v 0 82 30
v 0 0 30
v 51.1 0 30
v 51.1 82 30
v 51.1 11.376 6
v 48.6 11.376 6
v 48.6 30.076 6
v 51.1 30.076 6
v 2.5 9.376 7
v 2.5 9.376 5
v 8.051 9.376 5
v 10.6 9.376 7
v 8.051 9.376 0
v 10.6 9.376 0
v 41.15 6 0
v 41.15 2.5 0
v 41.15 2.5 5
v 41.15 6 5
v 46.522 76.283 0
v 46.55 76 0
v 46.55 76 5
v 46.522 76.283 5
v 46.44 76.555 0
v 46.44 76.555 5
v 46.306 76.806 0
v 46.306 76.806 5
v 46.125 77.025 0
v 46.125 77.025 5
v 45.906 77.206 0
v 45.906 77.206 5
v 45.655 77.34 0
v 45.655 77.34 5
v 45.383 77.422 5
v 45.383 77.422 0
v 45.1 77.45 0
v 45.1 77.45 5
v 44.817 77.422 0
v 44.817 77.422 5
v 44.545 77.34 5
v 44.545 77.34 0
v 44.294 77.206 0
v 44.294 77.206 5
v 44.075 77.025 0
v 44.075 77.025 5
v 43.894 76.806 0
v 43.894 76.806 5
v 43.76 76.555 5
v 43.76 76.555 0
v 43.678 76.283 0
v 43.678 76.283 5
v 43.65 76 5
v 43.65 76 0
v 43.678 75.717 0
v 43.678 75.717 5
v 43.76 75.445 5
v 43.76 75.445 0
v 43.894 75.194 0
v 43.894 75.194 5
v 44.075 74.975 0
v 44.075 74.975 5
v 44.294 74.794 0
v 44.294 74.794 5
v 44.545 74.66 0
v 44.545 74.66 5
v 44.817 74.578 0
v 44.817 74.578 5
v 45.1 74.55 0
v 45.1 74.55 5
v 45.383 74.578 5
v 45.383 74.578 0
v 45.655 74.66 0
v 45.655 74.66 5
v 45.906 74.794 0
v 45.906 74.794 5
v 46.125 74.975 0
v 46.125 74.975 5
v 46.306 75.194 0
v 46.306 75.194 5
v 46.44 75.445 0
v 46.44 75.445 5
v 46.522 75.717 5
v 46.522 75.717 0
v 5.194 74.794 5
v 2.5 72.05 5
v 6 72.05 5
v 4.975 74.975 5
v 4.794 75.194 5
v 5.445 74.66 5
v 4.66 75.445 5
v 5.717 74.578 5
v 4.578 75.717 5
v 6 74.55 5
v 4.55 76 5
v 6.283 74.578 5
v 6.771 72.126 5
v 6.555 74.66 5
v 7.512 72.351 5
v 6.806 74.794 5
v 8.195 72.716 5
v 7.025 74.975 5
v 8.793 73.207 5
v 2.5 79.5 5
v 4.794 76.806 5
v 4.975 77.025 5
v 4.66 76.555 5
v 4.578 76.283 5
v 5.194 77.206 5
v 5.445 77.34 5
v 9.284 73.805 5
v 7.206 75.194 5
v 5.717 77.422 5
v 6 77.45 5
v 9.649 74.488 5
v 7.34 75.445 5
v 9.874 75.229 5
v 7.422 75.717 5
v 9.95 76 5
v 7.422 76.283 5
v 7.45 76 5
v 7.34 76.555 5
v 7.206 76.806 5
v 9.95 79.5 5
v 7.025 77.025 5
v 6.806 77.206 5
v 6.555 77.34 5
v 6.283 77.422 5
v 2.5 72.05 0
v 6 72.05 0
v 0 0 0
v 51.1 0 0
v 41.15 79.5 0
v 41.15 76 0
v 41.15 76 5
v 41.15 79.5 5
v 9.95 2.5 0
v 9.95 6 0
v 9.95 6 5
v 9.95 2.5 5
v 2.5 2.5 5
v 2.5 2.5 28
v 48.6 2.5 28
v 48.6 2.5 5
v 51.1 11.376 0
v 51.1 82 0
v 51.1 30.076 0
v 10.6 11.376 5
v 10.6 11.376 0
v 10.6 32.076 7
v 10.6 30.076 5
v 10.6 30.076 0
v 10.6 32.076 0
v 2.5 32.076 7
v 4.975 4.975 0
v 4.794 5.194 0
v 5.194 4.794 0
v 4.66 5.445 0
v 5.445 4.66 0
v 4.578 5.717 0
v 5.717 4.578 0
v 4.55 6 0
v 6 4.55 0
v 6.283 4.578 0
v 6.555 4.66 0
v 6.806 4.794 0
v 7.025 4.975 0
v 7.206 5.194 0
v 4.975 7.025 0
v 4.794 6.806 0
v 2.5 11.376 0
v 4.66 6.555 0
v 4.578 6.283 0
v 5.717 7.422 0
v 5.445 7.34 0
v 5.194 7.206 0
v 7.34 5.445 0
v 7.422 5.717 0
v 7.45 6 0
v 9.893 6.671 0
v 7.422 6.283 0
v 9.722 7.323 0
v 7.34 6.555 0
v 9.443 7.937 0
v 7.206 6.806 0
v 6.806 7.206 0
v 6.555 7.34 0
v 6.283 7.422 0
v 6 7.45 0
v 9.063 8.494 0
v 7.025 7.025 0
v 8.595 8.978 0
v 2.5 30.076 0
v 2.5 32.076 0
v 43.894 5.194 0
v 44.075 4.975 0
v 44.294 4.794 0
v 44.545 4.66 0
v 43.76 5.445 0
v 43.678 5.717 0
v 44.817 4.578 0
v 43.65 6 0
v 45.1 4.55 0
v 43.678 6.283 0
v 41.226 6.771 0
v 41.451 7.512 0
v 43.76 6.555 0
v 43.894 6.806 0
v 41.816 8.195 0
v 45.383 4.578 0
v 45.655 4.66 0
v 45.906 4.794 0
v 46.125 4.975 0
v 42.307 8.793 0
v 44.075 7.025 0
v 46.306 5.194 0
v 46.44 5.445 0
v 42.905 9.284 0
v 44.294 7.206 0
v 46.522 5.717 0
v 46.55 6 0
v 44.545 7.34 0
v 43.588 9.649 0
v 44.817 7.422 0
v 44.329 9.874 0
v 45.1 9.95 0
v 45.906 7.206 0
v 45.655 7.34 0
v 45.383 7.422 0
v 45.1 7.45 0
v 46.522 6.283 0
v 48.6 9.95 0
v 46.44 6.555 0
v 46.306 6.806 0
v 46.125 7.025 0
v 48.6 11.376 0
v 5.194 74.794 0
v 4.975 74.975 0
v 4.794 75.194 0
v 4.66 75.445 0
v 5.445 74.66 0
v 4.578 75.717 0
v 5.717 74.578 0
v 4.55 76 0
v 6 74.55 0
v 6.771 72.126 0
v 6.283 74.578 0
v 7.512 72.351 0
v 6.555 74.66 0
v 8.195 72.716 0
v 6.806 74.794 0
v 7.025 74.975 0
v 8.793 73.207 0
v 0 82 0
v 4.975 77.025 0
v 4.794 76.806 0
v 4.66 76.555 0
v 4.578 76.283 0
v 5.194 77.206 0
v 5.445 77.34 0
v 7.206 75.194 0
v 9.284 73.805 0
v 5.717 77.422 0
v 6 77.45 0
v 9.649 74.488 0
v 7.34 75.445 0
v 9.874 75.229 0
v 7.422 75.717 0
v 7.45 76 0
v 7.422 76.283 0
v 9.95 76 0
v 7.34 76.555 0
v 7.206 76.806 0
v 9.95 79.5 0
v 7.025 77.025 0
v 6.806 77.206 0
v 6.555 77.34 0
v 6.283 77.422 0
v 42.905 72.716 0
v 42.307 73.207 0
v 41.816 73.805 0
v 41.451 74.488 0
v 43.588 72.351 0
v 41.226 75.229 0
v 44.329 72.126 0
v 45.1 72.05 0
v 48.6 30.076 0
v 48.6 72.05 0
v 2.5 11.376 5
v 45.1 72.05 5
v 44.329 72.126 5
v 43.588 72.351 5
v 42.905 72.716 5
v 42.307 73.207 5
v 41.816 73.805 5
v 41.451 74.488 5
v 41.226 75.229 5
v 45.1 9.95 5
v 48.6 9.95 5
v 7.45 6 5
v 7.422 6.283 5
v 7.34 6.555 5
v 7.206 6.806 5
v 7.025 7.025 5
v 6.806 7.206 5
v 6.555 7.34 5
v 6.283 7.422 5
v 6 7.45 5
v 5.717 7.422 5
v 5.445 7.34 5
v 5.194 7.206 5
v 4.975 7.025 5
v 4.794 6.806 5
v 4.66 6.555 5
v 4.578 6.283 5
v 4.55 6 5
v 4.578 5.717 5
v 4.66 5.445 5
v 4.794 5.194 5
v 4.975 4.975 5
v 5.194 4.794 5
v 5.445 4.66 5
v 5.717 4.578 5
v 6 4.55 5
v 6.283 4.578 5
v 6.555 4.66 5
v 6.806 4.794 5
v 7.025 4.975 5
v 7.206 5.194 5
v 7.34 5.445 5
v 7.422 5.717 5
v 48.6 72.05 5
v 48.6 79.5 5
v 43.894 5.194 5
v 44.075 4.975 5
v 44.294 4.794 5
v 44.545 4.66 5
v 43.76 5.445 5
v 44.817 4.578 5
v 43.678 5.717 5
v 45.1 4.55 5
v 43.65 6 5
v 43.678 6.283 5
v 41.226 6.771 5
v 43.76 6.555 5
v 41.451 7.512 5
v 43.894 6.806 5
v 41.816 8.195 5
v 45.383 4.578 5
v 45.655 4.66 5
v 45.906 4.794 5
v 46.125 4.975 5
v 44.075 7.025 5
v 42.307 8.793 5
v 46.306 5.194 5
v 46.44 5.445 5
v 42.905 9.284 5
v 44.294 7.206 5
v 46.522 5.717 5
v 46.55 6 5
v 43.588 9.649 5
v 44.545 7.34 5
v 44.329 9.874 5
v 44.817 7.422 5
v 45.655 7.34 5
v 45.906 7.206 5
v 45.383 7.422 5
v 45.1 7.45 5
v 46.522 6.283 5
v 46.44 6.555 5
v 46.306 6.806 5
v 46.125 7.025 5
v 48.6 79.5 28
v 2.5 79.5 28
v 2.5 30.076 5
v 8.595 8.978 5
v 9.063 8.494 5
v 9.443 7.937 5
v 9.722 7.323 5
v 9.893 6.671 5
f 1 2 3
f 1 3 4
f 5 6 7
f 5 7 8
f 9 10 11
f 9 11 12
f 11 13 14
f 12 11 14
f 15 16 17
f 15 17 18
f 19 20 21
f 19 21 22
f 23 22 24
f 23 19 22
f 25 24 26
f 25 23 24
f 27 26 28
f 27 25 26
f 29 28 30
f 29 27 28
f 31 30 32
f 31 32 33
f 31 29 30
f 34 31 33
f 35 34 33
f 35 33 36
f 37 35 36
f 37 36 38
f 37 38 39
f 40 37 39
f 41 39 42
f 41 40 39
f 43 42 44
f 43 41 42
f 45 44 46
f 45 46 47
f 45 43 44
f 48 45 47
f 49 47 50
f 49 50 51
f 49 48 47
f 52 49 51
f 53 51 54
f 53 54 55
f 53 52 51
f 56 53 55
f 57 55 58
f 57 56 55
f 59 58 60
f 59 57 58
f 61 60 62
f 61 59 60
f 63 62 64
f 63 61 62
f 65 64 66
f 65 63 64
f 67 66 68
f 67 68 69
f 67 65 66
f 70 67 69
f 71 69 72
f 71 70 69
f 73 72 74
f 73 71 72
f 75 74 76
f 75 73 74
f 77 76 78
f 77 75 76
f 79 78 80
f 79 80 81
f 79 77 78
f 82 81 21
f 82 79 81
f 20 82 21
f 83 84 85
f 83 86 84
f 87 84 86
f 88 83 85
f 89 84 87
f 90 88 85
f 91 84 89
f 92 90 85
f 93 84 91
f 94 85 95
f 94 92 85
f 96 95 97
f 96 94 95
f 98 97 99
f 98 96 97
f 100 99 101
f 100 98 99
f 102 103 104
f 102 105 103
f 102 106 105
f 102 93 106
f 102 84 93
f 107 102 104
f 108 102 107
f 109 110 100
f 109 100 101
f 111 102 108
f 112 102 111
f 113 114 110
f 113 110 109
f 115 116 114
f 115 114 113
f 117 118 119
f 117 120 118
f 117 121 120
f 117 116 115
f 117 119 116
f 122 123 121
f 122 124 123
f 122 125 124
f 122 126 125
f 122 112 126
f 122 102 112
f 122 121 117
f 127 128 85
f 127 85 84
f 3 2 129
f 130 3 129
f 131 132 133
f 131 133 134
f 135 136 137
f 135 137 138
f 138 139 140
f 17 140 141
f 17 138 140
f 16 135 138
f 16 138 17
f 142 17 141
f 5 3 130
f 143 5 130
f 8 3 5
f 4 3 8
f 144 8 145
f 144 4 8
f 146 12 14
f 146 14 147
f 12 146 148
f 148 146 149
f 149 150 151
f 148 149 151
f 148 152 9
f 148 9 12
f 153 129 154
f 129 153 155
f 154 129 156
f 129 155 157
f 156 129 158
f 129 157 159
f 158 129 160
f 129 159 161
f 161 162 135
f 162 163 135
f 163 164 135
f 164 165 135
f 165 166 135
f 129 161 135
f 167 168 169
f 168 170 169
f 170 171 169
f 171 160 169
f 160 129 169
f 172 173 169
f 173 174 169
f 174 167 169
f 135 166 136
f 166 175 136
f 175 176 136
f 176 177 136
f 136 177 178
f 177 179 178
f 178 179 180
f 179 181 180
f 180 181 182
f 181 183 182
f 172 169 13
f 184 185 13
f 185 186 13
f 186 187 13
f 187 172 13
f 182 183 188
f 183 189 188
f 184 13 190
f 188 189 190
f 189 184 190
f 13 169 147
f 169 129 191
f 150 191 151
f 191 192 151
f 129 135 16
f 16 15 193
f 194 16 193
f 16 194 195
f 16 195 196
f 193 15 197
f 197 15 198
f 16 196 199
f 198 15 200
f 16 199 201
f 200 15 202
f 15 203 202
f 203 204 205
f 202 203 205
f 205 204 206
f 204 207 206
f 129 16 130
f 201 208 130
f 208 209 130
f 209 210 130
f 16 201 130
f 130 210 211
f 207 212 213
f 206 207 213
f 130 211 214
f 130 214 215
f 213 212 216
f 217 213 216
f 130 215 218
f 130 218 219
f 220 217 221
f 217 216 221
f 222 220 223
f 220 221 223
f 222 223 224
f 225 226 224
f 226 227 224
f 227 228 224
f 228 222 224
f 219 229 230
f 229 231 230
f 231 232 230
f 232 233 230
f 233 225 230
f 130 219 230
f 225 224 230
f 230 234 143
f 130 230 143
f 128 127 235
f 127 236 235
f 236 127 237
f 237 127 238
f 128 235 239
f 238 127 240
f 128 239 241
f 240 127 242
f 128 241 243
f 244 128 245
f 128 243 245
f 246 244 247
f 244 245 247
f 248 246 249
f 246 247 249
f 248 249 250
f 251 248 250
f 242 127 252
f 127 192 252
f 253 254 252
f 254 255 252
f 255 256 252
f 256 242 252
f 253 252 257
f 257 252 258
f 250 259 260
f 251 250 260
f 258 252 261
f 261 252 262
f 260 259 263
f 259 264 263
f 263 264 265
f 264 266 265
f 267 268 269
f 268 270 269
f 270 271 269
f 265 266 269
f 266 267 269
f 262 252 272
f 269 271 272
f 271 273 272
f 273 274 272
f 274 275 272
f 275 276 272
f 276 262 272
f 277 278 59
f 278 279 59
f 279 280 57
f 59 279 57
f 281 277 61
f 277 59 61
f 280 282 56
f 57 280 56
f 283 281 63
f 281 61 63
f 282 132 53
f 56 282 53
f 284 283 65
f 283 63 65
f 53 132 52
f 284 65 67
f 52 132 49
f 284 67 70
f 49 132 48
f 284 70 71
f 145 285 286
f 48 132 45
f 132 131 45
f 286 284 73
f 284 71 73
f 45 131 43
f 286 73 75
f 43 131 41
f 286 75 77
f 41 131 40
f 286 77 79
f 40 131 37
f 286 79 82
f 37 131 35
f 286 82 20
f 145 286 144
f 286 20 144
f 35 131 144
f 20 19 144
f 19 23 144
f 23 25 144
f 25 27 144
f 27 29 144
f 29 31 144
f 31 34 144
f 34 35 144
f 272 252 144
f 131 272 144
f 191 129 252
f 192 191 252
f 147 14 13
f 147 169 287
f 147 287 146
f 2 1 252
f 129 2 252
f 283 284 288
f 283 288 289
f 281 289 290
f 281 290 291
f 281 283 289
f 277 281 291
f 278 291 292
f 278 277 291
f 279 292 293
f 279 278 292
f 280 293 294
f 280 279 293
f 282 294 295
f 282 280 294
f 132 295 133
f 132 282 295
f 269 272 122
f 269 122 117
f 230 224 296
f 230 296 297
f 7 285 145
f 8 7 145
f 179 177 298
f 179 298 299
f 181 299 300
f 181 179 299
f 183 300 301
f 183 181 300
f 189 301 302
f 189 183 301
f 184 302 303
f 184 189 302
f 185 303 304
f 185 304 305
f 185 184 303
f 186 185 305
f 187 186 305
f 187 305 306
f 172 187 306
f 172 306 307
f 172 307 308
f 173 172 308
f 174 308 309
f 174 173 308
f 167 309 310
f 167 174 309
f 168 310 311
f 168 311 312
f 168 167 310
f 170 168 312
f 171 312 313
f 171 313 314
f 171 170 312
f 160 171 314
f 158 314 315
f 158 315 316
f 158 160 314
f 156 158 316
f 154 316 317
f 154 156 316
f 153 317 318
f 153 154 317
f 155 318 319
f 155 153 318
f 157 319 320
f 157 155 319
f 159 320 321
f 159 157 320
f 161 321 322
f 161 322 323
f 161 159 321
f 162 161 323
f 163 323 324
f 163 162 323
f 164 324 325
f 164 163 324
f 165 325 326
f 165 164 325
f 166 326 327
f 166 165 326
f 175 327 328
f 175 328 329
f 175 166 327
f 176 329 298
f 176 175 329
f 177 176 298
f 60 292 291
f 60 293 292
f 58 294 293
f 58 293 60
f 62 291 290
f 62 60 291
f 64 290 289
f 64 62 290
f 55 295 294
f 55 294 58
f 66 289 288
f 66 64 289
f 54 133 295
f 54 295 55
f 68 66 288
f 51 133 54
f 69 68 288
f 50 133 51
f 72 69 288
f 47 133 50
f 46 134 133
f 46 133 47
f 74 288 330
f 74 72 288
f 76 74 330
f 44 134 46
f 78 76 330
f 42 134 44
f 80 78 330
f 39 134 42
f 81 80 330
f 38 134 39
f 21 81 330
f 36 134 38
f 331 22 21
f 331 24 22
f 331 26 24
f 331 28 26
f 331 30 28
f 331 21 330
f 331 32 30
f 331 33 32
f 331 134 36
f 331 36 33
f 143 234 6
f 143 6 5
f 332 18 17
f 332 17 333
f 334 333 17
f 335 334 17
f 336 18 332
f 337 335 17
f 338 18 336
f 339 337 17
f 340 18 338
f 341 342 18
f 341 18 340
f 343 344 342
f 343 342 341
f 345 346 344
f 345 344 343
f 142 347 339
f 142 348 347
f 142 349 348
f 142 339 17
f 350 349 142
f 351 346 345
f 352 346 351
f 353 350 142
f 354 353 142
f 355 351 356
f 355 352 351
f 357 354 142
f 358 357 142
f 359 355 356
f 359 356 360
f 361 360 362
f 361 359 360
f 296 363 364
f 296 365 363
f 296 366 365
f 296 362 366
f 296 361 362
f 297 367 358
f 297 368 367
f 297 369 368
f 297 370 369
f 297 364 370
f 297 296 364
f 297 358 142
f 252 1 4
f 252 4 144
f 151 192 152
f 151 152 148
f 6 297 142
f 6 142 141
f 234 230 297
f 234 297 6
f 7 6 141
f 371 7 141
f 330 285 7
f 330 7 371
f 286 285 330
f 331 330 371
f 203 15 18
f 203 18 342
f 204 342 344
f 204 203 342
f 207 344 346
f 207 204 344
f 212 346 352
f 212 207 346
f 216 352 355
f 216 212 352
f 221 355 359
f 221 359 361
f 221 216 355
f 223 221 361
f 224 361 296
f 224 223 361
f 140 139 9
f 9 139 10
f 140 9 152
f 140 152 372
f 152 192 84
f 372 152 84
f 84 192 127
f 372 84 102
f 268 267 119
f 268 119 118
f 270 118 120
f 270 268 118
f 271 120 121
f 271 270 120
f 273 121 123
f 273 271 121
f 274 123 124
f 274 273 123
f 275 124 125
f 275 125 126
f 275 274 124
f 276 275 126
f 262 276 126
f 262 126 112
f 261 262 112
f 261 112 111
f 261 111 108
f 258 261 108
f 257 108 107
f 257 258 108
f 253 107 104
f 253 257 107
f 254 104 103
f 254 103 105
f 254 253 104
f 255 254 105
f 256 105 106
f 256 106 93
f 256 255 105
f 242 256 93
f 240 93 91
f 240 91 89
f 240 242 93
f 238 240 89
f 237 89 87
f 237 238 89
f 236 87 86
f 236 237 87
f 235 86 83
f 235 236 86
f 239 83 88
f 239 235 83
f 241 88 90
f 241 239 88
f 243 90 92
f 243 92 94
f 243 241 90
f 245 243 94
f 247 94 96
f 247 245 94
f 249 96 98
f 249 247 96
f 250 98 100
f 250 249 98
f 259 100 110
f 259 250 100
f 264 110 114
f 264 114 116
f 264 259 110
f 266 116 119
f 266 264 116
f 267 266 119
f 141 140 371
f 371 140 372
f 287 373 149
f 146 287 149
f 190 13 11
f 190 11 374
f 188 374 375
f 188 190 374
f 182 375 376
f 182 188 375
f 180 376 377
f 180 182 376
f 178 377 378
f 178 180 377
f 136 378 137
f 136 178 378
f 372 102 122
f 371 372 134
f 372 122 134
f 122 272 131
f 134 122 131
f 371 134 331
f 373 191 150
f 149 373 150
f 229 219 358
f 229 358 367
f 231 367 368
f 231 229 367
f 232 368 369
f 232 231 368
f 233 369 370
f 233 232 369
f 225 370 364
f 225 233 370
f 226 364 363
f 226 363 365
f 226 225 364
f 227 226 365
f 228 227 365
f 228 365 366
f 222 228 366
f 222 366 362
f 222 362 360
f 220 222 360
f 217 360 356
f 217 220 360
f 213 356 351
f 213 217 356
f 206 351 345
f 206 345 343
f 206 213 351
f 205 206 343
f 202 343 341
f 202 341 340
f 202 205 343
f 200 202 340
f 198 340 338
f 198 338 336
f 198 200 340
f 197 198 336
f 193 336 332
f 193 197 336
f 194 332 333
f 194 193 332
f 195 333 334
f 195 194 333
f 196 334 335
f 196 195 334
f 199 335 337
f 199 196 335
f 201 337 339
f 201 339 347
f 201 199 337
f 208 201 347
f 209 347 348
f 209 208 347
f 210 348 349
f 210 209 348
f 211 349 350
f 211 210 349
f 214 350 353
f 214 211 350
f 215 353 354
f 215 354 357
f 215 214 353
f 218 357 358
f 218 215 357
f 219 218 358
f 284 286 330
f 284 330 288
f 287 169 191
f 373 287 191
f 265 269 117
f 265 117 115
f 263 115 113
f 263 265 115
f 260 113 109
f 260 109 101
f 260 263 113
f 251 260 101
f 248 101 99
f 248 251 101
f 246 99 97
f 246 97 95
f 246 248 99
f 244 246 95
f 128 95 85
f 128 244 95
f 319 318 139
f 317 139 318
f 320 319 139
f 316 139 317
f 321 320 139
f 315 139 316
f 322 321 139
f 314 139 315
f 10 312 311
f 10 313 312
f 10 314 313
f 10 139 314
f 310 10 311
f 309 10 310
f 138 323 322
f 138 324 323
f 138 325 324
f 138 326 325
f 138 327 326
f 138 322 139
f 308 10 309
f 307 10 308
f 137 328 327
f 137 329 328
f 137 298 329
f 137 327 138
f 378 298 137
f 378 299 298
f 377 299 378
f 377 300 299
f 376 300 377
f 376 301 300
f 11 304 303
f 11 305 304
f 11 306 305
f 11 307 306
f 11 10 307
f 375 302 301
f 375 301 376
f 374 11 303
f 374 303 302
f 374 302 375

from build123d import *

# Parameters (mm, degrees)
SKETCH1_W           = 51.1
SKETCH1_H           = 82
SKETCH1_R           = 1.45
BOSS_EXTRUDE1_DEPTH = 5
BOSS_EXTRUDE2_START = 5
SKETCH2_W           = 51.1
SKETCH2_H           = 82
SKETCH2_W_2         = 46.1
SKETCH2_H_2         = 77
BOSS_EXTRUDE2_DEPTH = 23
SKETCH4_W           = 2
SKETCH4_H           = 82
BOSS_EXTRUDE3_DEPTH = 51.1
SKETCH5_W           = 2.5
SKETCH5_H           = 18.7
CUT_EXTRUDE1_DEPTH  = 6
BOSS_EXTRUDE4_START = 5
SKETCH6_W           = 8.1
SKETCH6_H           = 18.7
BOSS_EXTRUDE4_DEPTH = 2
SKETCH7_W           = 8.1
SKETCH7_H           = 2
BOSS_EXTRUDE5_DEPTH = 7


with BuildPart() as part:
    # Sketch1 → Boss-Extrude1 (new body)
    with BuildSketch(Plane.XY):
        with Locations((25.55, 41)):
            Rectangle(SKETCH1_W, SKETCH1_H)
        with Locations((6, 76)):
            Circle(SKETCH1_R, mode=Mode.SUBTRACT)
        with Locations((45.1, 76)):
            Circle(SKETCH1_R, mode=Mode.SUBTRACT)
        with Locations((45.1, 6)):
            Circle(SKETCH1_R, mode=Mode.SUBTRACT)
        with Locations((6, 6)):
            Circle(SKETCH1_R, mode=Mode.SUBTRACT)
        with BuildLine():
            Line((6, 72.05), (2.5, 72.05))
            Line((2.5, 72.05), (2.5, 9.95))
            Line((2.5, 9.95), (6, 9.95))
            ThreePointArc((6, 9.95), (8.793071786, 8.793071786), (9.95, 6))
            Line((9.95, 6), (9.95, 2.5))
            Line((9.95, 2.5), (41.15, 2.5))
            Line((41.15, 2.5), (41.15, 6))
            ThreePointArc((41.15, 6), (42.306928214, 8.793071786), (45.1, 9.95))
            Line((45.1, 9.95), (48.6, 9.95))
            Line((48.6, 9.95), (48.6, 72.05))
            Line((48.6, 72.05), (45.1, 72.05))
            ThreePointArc((45.1, 72.05), (42.306928214, 73.206928214), (41.15, 76))
            Line((41.15, 76), (41.15, 79.5))
            Line((41.15, 79.5), (9.95, 79.5))
            Line((9.95, 79.5), (9.95, 76))
            ThreePointArc((9.95, 76), (8.793071786, 73.206928214), (6, 72.05))
        make_face(mode=Mode.SUBTRACT)
    extrude(amount=BOSS_EXTRUDE1_DEPTH)

    # Sketch2 → Boss-Extrude2 (add)
    with BuildSketch(Plane.XY.offset(BOSS_EXTRUDE2_START)):
        with Locations((25.55, 41)):
            Rectangle(SKETCH2_W, SKETCH2_H)
        with Locations((25.55, 41)):
            Rectangle(SKETCH2_W_2, SKETCH2_H_2, mode=Mode.SUBTRACT)
    extrude(amount=BOSS_EXTRUDE2_DEPTH)

    # Sketch4 → Boss-Extrude3 (add)
    with BuildSketch(Plane(origin=(0, 0, 0), x_dir=(0, 0, -1), z_dir=(1, 0, 0))):
        with Locations((-29, 41)):
            Rectangle(SKETCH4_W, SKETCH4_H)
    extrude(amount=BOSS_EXTRUDE3_DEPTH)

    # Sketch5 → Cut-Extrude1 (cut)
    with BuildSketch(Plane.XY):
        with Locations((49.85, 20.726044427)):
            Rectangle(SKETCH5_W, SKETCH5_H)
    extrude(amount=CUT_EXTRUDE1_DEPTH, mode=Mode.SUBTRACT)

    # Sketch6 → Boss-Extrude4 (add)
    with BuildSketch(Plane.XY.offset(BOSS_EXTRUDE4_START)):
        with Locations((6.55, 20.726044427)):
            Rectangle(SKETCH6_W, SKETCH6_H)
    extrude(amount=BOSS_EXTRUDE4_DEPTH)

    # Sketch7 → Boss-Extrude5 (add)
    with BuildSketch(Plane.XY):
        with Locations((6.55, 31.076044427)):
            Rectangle(SKETCH7_W, SKETCH7_H)
        with Locations((6.55, 10.376044427)):
            Rectangle(SKETCH7_W, SKETCH7_H)
    extrude(amount=BOSS_EXTRUDE5_DEPTH)


solid = part.part
